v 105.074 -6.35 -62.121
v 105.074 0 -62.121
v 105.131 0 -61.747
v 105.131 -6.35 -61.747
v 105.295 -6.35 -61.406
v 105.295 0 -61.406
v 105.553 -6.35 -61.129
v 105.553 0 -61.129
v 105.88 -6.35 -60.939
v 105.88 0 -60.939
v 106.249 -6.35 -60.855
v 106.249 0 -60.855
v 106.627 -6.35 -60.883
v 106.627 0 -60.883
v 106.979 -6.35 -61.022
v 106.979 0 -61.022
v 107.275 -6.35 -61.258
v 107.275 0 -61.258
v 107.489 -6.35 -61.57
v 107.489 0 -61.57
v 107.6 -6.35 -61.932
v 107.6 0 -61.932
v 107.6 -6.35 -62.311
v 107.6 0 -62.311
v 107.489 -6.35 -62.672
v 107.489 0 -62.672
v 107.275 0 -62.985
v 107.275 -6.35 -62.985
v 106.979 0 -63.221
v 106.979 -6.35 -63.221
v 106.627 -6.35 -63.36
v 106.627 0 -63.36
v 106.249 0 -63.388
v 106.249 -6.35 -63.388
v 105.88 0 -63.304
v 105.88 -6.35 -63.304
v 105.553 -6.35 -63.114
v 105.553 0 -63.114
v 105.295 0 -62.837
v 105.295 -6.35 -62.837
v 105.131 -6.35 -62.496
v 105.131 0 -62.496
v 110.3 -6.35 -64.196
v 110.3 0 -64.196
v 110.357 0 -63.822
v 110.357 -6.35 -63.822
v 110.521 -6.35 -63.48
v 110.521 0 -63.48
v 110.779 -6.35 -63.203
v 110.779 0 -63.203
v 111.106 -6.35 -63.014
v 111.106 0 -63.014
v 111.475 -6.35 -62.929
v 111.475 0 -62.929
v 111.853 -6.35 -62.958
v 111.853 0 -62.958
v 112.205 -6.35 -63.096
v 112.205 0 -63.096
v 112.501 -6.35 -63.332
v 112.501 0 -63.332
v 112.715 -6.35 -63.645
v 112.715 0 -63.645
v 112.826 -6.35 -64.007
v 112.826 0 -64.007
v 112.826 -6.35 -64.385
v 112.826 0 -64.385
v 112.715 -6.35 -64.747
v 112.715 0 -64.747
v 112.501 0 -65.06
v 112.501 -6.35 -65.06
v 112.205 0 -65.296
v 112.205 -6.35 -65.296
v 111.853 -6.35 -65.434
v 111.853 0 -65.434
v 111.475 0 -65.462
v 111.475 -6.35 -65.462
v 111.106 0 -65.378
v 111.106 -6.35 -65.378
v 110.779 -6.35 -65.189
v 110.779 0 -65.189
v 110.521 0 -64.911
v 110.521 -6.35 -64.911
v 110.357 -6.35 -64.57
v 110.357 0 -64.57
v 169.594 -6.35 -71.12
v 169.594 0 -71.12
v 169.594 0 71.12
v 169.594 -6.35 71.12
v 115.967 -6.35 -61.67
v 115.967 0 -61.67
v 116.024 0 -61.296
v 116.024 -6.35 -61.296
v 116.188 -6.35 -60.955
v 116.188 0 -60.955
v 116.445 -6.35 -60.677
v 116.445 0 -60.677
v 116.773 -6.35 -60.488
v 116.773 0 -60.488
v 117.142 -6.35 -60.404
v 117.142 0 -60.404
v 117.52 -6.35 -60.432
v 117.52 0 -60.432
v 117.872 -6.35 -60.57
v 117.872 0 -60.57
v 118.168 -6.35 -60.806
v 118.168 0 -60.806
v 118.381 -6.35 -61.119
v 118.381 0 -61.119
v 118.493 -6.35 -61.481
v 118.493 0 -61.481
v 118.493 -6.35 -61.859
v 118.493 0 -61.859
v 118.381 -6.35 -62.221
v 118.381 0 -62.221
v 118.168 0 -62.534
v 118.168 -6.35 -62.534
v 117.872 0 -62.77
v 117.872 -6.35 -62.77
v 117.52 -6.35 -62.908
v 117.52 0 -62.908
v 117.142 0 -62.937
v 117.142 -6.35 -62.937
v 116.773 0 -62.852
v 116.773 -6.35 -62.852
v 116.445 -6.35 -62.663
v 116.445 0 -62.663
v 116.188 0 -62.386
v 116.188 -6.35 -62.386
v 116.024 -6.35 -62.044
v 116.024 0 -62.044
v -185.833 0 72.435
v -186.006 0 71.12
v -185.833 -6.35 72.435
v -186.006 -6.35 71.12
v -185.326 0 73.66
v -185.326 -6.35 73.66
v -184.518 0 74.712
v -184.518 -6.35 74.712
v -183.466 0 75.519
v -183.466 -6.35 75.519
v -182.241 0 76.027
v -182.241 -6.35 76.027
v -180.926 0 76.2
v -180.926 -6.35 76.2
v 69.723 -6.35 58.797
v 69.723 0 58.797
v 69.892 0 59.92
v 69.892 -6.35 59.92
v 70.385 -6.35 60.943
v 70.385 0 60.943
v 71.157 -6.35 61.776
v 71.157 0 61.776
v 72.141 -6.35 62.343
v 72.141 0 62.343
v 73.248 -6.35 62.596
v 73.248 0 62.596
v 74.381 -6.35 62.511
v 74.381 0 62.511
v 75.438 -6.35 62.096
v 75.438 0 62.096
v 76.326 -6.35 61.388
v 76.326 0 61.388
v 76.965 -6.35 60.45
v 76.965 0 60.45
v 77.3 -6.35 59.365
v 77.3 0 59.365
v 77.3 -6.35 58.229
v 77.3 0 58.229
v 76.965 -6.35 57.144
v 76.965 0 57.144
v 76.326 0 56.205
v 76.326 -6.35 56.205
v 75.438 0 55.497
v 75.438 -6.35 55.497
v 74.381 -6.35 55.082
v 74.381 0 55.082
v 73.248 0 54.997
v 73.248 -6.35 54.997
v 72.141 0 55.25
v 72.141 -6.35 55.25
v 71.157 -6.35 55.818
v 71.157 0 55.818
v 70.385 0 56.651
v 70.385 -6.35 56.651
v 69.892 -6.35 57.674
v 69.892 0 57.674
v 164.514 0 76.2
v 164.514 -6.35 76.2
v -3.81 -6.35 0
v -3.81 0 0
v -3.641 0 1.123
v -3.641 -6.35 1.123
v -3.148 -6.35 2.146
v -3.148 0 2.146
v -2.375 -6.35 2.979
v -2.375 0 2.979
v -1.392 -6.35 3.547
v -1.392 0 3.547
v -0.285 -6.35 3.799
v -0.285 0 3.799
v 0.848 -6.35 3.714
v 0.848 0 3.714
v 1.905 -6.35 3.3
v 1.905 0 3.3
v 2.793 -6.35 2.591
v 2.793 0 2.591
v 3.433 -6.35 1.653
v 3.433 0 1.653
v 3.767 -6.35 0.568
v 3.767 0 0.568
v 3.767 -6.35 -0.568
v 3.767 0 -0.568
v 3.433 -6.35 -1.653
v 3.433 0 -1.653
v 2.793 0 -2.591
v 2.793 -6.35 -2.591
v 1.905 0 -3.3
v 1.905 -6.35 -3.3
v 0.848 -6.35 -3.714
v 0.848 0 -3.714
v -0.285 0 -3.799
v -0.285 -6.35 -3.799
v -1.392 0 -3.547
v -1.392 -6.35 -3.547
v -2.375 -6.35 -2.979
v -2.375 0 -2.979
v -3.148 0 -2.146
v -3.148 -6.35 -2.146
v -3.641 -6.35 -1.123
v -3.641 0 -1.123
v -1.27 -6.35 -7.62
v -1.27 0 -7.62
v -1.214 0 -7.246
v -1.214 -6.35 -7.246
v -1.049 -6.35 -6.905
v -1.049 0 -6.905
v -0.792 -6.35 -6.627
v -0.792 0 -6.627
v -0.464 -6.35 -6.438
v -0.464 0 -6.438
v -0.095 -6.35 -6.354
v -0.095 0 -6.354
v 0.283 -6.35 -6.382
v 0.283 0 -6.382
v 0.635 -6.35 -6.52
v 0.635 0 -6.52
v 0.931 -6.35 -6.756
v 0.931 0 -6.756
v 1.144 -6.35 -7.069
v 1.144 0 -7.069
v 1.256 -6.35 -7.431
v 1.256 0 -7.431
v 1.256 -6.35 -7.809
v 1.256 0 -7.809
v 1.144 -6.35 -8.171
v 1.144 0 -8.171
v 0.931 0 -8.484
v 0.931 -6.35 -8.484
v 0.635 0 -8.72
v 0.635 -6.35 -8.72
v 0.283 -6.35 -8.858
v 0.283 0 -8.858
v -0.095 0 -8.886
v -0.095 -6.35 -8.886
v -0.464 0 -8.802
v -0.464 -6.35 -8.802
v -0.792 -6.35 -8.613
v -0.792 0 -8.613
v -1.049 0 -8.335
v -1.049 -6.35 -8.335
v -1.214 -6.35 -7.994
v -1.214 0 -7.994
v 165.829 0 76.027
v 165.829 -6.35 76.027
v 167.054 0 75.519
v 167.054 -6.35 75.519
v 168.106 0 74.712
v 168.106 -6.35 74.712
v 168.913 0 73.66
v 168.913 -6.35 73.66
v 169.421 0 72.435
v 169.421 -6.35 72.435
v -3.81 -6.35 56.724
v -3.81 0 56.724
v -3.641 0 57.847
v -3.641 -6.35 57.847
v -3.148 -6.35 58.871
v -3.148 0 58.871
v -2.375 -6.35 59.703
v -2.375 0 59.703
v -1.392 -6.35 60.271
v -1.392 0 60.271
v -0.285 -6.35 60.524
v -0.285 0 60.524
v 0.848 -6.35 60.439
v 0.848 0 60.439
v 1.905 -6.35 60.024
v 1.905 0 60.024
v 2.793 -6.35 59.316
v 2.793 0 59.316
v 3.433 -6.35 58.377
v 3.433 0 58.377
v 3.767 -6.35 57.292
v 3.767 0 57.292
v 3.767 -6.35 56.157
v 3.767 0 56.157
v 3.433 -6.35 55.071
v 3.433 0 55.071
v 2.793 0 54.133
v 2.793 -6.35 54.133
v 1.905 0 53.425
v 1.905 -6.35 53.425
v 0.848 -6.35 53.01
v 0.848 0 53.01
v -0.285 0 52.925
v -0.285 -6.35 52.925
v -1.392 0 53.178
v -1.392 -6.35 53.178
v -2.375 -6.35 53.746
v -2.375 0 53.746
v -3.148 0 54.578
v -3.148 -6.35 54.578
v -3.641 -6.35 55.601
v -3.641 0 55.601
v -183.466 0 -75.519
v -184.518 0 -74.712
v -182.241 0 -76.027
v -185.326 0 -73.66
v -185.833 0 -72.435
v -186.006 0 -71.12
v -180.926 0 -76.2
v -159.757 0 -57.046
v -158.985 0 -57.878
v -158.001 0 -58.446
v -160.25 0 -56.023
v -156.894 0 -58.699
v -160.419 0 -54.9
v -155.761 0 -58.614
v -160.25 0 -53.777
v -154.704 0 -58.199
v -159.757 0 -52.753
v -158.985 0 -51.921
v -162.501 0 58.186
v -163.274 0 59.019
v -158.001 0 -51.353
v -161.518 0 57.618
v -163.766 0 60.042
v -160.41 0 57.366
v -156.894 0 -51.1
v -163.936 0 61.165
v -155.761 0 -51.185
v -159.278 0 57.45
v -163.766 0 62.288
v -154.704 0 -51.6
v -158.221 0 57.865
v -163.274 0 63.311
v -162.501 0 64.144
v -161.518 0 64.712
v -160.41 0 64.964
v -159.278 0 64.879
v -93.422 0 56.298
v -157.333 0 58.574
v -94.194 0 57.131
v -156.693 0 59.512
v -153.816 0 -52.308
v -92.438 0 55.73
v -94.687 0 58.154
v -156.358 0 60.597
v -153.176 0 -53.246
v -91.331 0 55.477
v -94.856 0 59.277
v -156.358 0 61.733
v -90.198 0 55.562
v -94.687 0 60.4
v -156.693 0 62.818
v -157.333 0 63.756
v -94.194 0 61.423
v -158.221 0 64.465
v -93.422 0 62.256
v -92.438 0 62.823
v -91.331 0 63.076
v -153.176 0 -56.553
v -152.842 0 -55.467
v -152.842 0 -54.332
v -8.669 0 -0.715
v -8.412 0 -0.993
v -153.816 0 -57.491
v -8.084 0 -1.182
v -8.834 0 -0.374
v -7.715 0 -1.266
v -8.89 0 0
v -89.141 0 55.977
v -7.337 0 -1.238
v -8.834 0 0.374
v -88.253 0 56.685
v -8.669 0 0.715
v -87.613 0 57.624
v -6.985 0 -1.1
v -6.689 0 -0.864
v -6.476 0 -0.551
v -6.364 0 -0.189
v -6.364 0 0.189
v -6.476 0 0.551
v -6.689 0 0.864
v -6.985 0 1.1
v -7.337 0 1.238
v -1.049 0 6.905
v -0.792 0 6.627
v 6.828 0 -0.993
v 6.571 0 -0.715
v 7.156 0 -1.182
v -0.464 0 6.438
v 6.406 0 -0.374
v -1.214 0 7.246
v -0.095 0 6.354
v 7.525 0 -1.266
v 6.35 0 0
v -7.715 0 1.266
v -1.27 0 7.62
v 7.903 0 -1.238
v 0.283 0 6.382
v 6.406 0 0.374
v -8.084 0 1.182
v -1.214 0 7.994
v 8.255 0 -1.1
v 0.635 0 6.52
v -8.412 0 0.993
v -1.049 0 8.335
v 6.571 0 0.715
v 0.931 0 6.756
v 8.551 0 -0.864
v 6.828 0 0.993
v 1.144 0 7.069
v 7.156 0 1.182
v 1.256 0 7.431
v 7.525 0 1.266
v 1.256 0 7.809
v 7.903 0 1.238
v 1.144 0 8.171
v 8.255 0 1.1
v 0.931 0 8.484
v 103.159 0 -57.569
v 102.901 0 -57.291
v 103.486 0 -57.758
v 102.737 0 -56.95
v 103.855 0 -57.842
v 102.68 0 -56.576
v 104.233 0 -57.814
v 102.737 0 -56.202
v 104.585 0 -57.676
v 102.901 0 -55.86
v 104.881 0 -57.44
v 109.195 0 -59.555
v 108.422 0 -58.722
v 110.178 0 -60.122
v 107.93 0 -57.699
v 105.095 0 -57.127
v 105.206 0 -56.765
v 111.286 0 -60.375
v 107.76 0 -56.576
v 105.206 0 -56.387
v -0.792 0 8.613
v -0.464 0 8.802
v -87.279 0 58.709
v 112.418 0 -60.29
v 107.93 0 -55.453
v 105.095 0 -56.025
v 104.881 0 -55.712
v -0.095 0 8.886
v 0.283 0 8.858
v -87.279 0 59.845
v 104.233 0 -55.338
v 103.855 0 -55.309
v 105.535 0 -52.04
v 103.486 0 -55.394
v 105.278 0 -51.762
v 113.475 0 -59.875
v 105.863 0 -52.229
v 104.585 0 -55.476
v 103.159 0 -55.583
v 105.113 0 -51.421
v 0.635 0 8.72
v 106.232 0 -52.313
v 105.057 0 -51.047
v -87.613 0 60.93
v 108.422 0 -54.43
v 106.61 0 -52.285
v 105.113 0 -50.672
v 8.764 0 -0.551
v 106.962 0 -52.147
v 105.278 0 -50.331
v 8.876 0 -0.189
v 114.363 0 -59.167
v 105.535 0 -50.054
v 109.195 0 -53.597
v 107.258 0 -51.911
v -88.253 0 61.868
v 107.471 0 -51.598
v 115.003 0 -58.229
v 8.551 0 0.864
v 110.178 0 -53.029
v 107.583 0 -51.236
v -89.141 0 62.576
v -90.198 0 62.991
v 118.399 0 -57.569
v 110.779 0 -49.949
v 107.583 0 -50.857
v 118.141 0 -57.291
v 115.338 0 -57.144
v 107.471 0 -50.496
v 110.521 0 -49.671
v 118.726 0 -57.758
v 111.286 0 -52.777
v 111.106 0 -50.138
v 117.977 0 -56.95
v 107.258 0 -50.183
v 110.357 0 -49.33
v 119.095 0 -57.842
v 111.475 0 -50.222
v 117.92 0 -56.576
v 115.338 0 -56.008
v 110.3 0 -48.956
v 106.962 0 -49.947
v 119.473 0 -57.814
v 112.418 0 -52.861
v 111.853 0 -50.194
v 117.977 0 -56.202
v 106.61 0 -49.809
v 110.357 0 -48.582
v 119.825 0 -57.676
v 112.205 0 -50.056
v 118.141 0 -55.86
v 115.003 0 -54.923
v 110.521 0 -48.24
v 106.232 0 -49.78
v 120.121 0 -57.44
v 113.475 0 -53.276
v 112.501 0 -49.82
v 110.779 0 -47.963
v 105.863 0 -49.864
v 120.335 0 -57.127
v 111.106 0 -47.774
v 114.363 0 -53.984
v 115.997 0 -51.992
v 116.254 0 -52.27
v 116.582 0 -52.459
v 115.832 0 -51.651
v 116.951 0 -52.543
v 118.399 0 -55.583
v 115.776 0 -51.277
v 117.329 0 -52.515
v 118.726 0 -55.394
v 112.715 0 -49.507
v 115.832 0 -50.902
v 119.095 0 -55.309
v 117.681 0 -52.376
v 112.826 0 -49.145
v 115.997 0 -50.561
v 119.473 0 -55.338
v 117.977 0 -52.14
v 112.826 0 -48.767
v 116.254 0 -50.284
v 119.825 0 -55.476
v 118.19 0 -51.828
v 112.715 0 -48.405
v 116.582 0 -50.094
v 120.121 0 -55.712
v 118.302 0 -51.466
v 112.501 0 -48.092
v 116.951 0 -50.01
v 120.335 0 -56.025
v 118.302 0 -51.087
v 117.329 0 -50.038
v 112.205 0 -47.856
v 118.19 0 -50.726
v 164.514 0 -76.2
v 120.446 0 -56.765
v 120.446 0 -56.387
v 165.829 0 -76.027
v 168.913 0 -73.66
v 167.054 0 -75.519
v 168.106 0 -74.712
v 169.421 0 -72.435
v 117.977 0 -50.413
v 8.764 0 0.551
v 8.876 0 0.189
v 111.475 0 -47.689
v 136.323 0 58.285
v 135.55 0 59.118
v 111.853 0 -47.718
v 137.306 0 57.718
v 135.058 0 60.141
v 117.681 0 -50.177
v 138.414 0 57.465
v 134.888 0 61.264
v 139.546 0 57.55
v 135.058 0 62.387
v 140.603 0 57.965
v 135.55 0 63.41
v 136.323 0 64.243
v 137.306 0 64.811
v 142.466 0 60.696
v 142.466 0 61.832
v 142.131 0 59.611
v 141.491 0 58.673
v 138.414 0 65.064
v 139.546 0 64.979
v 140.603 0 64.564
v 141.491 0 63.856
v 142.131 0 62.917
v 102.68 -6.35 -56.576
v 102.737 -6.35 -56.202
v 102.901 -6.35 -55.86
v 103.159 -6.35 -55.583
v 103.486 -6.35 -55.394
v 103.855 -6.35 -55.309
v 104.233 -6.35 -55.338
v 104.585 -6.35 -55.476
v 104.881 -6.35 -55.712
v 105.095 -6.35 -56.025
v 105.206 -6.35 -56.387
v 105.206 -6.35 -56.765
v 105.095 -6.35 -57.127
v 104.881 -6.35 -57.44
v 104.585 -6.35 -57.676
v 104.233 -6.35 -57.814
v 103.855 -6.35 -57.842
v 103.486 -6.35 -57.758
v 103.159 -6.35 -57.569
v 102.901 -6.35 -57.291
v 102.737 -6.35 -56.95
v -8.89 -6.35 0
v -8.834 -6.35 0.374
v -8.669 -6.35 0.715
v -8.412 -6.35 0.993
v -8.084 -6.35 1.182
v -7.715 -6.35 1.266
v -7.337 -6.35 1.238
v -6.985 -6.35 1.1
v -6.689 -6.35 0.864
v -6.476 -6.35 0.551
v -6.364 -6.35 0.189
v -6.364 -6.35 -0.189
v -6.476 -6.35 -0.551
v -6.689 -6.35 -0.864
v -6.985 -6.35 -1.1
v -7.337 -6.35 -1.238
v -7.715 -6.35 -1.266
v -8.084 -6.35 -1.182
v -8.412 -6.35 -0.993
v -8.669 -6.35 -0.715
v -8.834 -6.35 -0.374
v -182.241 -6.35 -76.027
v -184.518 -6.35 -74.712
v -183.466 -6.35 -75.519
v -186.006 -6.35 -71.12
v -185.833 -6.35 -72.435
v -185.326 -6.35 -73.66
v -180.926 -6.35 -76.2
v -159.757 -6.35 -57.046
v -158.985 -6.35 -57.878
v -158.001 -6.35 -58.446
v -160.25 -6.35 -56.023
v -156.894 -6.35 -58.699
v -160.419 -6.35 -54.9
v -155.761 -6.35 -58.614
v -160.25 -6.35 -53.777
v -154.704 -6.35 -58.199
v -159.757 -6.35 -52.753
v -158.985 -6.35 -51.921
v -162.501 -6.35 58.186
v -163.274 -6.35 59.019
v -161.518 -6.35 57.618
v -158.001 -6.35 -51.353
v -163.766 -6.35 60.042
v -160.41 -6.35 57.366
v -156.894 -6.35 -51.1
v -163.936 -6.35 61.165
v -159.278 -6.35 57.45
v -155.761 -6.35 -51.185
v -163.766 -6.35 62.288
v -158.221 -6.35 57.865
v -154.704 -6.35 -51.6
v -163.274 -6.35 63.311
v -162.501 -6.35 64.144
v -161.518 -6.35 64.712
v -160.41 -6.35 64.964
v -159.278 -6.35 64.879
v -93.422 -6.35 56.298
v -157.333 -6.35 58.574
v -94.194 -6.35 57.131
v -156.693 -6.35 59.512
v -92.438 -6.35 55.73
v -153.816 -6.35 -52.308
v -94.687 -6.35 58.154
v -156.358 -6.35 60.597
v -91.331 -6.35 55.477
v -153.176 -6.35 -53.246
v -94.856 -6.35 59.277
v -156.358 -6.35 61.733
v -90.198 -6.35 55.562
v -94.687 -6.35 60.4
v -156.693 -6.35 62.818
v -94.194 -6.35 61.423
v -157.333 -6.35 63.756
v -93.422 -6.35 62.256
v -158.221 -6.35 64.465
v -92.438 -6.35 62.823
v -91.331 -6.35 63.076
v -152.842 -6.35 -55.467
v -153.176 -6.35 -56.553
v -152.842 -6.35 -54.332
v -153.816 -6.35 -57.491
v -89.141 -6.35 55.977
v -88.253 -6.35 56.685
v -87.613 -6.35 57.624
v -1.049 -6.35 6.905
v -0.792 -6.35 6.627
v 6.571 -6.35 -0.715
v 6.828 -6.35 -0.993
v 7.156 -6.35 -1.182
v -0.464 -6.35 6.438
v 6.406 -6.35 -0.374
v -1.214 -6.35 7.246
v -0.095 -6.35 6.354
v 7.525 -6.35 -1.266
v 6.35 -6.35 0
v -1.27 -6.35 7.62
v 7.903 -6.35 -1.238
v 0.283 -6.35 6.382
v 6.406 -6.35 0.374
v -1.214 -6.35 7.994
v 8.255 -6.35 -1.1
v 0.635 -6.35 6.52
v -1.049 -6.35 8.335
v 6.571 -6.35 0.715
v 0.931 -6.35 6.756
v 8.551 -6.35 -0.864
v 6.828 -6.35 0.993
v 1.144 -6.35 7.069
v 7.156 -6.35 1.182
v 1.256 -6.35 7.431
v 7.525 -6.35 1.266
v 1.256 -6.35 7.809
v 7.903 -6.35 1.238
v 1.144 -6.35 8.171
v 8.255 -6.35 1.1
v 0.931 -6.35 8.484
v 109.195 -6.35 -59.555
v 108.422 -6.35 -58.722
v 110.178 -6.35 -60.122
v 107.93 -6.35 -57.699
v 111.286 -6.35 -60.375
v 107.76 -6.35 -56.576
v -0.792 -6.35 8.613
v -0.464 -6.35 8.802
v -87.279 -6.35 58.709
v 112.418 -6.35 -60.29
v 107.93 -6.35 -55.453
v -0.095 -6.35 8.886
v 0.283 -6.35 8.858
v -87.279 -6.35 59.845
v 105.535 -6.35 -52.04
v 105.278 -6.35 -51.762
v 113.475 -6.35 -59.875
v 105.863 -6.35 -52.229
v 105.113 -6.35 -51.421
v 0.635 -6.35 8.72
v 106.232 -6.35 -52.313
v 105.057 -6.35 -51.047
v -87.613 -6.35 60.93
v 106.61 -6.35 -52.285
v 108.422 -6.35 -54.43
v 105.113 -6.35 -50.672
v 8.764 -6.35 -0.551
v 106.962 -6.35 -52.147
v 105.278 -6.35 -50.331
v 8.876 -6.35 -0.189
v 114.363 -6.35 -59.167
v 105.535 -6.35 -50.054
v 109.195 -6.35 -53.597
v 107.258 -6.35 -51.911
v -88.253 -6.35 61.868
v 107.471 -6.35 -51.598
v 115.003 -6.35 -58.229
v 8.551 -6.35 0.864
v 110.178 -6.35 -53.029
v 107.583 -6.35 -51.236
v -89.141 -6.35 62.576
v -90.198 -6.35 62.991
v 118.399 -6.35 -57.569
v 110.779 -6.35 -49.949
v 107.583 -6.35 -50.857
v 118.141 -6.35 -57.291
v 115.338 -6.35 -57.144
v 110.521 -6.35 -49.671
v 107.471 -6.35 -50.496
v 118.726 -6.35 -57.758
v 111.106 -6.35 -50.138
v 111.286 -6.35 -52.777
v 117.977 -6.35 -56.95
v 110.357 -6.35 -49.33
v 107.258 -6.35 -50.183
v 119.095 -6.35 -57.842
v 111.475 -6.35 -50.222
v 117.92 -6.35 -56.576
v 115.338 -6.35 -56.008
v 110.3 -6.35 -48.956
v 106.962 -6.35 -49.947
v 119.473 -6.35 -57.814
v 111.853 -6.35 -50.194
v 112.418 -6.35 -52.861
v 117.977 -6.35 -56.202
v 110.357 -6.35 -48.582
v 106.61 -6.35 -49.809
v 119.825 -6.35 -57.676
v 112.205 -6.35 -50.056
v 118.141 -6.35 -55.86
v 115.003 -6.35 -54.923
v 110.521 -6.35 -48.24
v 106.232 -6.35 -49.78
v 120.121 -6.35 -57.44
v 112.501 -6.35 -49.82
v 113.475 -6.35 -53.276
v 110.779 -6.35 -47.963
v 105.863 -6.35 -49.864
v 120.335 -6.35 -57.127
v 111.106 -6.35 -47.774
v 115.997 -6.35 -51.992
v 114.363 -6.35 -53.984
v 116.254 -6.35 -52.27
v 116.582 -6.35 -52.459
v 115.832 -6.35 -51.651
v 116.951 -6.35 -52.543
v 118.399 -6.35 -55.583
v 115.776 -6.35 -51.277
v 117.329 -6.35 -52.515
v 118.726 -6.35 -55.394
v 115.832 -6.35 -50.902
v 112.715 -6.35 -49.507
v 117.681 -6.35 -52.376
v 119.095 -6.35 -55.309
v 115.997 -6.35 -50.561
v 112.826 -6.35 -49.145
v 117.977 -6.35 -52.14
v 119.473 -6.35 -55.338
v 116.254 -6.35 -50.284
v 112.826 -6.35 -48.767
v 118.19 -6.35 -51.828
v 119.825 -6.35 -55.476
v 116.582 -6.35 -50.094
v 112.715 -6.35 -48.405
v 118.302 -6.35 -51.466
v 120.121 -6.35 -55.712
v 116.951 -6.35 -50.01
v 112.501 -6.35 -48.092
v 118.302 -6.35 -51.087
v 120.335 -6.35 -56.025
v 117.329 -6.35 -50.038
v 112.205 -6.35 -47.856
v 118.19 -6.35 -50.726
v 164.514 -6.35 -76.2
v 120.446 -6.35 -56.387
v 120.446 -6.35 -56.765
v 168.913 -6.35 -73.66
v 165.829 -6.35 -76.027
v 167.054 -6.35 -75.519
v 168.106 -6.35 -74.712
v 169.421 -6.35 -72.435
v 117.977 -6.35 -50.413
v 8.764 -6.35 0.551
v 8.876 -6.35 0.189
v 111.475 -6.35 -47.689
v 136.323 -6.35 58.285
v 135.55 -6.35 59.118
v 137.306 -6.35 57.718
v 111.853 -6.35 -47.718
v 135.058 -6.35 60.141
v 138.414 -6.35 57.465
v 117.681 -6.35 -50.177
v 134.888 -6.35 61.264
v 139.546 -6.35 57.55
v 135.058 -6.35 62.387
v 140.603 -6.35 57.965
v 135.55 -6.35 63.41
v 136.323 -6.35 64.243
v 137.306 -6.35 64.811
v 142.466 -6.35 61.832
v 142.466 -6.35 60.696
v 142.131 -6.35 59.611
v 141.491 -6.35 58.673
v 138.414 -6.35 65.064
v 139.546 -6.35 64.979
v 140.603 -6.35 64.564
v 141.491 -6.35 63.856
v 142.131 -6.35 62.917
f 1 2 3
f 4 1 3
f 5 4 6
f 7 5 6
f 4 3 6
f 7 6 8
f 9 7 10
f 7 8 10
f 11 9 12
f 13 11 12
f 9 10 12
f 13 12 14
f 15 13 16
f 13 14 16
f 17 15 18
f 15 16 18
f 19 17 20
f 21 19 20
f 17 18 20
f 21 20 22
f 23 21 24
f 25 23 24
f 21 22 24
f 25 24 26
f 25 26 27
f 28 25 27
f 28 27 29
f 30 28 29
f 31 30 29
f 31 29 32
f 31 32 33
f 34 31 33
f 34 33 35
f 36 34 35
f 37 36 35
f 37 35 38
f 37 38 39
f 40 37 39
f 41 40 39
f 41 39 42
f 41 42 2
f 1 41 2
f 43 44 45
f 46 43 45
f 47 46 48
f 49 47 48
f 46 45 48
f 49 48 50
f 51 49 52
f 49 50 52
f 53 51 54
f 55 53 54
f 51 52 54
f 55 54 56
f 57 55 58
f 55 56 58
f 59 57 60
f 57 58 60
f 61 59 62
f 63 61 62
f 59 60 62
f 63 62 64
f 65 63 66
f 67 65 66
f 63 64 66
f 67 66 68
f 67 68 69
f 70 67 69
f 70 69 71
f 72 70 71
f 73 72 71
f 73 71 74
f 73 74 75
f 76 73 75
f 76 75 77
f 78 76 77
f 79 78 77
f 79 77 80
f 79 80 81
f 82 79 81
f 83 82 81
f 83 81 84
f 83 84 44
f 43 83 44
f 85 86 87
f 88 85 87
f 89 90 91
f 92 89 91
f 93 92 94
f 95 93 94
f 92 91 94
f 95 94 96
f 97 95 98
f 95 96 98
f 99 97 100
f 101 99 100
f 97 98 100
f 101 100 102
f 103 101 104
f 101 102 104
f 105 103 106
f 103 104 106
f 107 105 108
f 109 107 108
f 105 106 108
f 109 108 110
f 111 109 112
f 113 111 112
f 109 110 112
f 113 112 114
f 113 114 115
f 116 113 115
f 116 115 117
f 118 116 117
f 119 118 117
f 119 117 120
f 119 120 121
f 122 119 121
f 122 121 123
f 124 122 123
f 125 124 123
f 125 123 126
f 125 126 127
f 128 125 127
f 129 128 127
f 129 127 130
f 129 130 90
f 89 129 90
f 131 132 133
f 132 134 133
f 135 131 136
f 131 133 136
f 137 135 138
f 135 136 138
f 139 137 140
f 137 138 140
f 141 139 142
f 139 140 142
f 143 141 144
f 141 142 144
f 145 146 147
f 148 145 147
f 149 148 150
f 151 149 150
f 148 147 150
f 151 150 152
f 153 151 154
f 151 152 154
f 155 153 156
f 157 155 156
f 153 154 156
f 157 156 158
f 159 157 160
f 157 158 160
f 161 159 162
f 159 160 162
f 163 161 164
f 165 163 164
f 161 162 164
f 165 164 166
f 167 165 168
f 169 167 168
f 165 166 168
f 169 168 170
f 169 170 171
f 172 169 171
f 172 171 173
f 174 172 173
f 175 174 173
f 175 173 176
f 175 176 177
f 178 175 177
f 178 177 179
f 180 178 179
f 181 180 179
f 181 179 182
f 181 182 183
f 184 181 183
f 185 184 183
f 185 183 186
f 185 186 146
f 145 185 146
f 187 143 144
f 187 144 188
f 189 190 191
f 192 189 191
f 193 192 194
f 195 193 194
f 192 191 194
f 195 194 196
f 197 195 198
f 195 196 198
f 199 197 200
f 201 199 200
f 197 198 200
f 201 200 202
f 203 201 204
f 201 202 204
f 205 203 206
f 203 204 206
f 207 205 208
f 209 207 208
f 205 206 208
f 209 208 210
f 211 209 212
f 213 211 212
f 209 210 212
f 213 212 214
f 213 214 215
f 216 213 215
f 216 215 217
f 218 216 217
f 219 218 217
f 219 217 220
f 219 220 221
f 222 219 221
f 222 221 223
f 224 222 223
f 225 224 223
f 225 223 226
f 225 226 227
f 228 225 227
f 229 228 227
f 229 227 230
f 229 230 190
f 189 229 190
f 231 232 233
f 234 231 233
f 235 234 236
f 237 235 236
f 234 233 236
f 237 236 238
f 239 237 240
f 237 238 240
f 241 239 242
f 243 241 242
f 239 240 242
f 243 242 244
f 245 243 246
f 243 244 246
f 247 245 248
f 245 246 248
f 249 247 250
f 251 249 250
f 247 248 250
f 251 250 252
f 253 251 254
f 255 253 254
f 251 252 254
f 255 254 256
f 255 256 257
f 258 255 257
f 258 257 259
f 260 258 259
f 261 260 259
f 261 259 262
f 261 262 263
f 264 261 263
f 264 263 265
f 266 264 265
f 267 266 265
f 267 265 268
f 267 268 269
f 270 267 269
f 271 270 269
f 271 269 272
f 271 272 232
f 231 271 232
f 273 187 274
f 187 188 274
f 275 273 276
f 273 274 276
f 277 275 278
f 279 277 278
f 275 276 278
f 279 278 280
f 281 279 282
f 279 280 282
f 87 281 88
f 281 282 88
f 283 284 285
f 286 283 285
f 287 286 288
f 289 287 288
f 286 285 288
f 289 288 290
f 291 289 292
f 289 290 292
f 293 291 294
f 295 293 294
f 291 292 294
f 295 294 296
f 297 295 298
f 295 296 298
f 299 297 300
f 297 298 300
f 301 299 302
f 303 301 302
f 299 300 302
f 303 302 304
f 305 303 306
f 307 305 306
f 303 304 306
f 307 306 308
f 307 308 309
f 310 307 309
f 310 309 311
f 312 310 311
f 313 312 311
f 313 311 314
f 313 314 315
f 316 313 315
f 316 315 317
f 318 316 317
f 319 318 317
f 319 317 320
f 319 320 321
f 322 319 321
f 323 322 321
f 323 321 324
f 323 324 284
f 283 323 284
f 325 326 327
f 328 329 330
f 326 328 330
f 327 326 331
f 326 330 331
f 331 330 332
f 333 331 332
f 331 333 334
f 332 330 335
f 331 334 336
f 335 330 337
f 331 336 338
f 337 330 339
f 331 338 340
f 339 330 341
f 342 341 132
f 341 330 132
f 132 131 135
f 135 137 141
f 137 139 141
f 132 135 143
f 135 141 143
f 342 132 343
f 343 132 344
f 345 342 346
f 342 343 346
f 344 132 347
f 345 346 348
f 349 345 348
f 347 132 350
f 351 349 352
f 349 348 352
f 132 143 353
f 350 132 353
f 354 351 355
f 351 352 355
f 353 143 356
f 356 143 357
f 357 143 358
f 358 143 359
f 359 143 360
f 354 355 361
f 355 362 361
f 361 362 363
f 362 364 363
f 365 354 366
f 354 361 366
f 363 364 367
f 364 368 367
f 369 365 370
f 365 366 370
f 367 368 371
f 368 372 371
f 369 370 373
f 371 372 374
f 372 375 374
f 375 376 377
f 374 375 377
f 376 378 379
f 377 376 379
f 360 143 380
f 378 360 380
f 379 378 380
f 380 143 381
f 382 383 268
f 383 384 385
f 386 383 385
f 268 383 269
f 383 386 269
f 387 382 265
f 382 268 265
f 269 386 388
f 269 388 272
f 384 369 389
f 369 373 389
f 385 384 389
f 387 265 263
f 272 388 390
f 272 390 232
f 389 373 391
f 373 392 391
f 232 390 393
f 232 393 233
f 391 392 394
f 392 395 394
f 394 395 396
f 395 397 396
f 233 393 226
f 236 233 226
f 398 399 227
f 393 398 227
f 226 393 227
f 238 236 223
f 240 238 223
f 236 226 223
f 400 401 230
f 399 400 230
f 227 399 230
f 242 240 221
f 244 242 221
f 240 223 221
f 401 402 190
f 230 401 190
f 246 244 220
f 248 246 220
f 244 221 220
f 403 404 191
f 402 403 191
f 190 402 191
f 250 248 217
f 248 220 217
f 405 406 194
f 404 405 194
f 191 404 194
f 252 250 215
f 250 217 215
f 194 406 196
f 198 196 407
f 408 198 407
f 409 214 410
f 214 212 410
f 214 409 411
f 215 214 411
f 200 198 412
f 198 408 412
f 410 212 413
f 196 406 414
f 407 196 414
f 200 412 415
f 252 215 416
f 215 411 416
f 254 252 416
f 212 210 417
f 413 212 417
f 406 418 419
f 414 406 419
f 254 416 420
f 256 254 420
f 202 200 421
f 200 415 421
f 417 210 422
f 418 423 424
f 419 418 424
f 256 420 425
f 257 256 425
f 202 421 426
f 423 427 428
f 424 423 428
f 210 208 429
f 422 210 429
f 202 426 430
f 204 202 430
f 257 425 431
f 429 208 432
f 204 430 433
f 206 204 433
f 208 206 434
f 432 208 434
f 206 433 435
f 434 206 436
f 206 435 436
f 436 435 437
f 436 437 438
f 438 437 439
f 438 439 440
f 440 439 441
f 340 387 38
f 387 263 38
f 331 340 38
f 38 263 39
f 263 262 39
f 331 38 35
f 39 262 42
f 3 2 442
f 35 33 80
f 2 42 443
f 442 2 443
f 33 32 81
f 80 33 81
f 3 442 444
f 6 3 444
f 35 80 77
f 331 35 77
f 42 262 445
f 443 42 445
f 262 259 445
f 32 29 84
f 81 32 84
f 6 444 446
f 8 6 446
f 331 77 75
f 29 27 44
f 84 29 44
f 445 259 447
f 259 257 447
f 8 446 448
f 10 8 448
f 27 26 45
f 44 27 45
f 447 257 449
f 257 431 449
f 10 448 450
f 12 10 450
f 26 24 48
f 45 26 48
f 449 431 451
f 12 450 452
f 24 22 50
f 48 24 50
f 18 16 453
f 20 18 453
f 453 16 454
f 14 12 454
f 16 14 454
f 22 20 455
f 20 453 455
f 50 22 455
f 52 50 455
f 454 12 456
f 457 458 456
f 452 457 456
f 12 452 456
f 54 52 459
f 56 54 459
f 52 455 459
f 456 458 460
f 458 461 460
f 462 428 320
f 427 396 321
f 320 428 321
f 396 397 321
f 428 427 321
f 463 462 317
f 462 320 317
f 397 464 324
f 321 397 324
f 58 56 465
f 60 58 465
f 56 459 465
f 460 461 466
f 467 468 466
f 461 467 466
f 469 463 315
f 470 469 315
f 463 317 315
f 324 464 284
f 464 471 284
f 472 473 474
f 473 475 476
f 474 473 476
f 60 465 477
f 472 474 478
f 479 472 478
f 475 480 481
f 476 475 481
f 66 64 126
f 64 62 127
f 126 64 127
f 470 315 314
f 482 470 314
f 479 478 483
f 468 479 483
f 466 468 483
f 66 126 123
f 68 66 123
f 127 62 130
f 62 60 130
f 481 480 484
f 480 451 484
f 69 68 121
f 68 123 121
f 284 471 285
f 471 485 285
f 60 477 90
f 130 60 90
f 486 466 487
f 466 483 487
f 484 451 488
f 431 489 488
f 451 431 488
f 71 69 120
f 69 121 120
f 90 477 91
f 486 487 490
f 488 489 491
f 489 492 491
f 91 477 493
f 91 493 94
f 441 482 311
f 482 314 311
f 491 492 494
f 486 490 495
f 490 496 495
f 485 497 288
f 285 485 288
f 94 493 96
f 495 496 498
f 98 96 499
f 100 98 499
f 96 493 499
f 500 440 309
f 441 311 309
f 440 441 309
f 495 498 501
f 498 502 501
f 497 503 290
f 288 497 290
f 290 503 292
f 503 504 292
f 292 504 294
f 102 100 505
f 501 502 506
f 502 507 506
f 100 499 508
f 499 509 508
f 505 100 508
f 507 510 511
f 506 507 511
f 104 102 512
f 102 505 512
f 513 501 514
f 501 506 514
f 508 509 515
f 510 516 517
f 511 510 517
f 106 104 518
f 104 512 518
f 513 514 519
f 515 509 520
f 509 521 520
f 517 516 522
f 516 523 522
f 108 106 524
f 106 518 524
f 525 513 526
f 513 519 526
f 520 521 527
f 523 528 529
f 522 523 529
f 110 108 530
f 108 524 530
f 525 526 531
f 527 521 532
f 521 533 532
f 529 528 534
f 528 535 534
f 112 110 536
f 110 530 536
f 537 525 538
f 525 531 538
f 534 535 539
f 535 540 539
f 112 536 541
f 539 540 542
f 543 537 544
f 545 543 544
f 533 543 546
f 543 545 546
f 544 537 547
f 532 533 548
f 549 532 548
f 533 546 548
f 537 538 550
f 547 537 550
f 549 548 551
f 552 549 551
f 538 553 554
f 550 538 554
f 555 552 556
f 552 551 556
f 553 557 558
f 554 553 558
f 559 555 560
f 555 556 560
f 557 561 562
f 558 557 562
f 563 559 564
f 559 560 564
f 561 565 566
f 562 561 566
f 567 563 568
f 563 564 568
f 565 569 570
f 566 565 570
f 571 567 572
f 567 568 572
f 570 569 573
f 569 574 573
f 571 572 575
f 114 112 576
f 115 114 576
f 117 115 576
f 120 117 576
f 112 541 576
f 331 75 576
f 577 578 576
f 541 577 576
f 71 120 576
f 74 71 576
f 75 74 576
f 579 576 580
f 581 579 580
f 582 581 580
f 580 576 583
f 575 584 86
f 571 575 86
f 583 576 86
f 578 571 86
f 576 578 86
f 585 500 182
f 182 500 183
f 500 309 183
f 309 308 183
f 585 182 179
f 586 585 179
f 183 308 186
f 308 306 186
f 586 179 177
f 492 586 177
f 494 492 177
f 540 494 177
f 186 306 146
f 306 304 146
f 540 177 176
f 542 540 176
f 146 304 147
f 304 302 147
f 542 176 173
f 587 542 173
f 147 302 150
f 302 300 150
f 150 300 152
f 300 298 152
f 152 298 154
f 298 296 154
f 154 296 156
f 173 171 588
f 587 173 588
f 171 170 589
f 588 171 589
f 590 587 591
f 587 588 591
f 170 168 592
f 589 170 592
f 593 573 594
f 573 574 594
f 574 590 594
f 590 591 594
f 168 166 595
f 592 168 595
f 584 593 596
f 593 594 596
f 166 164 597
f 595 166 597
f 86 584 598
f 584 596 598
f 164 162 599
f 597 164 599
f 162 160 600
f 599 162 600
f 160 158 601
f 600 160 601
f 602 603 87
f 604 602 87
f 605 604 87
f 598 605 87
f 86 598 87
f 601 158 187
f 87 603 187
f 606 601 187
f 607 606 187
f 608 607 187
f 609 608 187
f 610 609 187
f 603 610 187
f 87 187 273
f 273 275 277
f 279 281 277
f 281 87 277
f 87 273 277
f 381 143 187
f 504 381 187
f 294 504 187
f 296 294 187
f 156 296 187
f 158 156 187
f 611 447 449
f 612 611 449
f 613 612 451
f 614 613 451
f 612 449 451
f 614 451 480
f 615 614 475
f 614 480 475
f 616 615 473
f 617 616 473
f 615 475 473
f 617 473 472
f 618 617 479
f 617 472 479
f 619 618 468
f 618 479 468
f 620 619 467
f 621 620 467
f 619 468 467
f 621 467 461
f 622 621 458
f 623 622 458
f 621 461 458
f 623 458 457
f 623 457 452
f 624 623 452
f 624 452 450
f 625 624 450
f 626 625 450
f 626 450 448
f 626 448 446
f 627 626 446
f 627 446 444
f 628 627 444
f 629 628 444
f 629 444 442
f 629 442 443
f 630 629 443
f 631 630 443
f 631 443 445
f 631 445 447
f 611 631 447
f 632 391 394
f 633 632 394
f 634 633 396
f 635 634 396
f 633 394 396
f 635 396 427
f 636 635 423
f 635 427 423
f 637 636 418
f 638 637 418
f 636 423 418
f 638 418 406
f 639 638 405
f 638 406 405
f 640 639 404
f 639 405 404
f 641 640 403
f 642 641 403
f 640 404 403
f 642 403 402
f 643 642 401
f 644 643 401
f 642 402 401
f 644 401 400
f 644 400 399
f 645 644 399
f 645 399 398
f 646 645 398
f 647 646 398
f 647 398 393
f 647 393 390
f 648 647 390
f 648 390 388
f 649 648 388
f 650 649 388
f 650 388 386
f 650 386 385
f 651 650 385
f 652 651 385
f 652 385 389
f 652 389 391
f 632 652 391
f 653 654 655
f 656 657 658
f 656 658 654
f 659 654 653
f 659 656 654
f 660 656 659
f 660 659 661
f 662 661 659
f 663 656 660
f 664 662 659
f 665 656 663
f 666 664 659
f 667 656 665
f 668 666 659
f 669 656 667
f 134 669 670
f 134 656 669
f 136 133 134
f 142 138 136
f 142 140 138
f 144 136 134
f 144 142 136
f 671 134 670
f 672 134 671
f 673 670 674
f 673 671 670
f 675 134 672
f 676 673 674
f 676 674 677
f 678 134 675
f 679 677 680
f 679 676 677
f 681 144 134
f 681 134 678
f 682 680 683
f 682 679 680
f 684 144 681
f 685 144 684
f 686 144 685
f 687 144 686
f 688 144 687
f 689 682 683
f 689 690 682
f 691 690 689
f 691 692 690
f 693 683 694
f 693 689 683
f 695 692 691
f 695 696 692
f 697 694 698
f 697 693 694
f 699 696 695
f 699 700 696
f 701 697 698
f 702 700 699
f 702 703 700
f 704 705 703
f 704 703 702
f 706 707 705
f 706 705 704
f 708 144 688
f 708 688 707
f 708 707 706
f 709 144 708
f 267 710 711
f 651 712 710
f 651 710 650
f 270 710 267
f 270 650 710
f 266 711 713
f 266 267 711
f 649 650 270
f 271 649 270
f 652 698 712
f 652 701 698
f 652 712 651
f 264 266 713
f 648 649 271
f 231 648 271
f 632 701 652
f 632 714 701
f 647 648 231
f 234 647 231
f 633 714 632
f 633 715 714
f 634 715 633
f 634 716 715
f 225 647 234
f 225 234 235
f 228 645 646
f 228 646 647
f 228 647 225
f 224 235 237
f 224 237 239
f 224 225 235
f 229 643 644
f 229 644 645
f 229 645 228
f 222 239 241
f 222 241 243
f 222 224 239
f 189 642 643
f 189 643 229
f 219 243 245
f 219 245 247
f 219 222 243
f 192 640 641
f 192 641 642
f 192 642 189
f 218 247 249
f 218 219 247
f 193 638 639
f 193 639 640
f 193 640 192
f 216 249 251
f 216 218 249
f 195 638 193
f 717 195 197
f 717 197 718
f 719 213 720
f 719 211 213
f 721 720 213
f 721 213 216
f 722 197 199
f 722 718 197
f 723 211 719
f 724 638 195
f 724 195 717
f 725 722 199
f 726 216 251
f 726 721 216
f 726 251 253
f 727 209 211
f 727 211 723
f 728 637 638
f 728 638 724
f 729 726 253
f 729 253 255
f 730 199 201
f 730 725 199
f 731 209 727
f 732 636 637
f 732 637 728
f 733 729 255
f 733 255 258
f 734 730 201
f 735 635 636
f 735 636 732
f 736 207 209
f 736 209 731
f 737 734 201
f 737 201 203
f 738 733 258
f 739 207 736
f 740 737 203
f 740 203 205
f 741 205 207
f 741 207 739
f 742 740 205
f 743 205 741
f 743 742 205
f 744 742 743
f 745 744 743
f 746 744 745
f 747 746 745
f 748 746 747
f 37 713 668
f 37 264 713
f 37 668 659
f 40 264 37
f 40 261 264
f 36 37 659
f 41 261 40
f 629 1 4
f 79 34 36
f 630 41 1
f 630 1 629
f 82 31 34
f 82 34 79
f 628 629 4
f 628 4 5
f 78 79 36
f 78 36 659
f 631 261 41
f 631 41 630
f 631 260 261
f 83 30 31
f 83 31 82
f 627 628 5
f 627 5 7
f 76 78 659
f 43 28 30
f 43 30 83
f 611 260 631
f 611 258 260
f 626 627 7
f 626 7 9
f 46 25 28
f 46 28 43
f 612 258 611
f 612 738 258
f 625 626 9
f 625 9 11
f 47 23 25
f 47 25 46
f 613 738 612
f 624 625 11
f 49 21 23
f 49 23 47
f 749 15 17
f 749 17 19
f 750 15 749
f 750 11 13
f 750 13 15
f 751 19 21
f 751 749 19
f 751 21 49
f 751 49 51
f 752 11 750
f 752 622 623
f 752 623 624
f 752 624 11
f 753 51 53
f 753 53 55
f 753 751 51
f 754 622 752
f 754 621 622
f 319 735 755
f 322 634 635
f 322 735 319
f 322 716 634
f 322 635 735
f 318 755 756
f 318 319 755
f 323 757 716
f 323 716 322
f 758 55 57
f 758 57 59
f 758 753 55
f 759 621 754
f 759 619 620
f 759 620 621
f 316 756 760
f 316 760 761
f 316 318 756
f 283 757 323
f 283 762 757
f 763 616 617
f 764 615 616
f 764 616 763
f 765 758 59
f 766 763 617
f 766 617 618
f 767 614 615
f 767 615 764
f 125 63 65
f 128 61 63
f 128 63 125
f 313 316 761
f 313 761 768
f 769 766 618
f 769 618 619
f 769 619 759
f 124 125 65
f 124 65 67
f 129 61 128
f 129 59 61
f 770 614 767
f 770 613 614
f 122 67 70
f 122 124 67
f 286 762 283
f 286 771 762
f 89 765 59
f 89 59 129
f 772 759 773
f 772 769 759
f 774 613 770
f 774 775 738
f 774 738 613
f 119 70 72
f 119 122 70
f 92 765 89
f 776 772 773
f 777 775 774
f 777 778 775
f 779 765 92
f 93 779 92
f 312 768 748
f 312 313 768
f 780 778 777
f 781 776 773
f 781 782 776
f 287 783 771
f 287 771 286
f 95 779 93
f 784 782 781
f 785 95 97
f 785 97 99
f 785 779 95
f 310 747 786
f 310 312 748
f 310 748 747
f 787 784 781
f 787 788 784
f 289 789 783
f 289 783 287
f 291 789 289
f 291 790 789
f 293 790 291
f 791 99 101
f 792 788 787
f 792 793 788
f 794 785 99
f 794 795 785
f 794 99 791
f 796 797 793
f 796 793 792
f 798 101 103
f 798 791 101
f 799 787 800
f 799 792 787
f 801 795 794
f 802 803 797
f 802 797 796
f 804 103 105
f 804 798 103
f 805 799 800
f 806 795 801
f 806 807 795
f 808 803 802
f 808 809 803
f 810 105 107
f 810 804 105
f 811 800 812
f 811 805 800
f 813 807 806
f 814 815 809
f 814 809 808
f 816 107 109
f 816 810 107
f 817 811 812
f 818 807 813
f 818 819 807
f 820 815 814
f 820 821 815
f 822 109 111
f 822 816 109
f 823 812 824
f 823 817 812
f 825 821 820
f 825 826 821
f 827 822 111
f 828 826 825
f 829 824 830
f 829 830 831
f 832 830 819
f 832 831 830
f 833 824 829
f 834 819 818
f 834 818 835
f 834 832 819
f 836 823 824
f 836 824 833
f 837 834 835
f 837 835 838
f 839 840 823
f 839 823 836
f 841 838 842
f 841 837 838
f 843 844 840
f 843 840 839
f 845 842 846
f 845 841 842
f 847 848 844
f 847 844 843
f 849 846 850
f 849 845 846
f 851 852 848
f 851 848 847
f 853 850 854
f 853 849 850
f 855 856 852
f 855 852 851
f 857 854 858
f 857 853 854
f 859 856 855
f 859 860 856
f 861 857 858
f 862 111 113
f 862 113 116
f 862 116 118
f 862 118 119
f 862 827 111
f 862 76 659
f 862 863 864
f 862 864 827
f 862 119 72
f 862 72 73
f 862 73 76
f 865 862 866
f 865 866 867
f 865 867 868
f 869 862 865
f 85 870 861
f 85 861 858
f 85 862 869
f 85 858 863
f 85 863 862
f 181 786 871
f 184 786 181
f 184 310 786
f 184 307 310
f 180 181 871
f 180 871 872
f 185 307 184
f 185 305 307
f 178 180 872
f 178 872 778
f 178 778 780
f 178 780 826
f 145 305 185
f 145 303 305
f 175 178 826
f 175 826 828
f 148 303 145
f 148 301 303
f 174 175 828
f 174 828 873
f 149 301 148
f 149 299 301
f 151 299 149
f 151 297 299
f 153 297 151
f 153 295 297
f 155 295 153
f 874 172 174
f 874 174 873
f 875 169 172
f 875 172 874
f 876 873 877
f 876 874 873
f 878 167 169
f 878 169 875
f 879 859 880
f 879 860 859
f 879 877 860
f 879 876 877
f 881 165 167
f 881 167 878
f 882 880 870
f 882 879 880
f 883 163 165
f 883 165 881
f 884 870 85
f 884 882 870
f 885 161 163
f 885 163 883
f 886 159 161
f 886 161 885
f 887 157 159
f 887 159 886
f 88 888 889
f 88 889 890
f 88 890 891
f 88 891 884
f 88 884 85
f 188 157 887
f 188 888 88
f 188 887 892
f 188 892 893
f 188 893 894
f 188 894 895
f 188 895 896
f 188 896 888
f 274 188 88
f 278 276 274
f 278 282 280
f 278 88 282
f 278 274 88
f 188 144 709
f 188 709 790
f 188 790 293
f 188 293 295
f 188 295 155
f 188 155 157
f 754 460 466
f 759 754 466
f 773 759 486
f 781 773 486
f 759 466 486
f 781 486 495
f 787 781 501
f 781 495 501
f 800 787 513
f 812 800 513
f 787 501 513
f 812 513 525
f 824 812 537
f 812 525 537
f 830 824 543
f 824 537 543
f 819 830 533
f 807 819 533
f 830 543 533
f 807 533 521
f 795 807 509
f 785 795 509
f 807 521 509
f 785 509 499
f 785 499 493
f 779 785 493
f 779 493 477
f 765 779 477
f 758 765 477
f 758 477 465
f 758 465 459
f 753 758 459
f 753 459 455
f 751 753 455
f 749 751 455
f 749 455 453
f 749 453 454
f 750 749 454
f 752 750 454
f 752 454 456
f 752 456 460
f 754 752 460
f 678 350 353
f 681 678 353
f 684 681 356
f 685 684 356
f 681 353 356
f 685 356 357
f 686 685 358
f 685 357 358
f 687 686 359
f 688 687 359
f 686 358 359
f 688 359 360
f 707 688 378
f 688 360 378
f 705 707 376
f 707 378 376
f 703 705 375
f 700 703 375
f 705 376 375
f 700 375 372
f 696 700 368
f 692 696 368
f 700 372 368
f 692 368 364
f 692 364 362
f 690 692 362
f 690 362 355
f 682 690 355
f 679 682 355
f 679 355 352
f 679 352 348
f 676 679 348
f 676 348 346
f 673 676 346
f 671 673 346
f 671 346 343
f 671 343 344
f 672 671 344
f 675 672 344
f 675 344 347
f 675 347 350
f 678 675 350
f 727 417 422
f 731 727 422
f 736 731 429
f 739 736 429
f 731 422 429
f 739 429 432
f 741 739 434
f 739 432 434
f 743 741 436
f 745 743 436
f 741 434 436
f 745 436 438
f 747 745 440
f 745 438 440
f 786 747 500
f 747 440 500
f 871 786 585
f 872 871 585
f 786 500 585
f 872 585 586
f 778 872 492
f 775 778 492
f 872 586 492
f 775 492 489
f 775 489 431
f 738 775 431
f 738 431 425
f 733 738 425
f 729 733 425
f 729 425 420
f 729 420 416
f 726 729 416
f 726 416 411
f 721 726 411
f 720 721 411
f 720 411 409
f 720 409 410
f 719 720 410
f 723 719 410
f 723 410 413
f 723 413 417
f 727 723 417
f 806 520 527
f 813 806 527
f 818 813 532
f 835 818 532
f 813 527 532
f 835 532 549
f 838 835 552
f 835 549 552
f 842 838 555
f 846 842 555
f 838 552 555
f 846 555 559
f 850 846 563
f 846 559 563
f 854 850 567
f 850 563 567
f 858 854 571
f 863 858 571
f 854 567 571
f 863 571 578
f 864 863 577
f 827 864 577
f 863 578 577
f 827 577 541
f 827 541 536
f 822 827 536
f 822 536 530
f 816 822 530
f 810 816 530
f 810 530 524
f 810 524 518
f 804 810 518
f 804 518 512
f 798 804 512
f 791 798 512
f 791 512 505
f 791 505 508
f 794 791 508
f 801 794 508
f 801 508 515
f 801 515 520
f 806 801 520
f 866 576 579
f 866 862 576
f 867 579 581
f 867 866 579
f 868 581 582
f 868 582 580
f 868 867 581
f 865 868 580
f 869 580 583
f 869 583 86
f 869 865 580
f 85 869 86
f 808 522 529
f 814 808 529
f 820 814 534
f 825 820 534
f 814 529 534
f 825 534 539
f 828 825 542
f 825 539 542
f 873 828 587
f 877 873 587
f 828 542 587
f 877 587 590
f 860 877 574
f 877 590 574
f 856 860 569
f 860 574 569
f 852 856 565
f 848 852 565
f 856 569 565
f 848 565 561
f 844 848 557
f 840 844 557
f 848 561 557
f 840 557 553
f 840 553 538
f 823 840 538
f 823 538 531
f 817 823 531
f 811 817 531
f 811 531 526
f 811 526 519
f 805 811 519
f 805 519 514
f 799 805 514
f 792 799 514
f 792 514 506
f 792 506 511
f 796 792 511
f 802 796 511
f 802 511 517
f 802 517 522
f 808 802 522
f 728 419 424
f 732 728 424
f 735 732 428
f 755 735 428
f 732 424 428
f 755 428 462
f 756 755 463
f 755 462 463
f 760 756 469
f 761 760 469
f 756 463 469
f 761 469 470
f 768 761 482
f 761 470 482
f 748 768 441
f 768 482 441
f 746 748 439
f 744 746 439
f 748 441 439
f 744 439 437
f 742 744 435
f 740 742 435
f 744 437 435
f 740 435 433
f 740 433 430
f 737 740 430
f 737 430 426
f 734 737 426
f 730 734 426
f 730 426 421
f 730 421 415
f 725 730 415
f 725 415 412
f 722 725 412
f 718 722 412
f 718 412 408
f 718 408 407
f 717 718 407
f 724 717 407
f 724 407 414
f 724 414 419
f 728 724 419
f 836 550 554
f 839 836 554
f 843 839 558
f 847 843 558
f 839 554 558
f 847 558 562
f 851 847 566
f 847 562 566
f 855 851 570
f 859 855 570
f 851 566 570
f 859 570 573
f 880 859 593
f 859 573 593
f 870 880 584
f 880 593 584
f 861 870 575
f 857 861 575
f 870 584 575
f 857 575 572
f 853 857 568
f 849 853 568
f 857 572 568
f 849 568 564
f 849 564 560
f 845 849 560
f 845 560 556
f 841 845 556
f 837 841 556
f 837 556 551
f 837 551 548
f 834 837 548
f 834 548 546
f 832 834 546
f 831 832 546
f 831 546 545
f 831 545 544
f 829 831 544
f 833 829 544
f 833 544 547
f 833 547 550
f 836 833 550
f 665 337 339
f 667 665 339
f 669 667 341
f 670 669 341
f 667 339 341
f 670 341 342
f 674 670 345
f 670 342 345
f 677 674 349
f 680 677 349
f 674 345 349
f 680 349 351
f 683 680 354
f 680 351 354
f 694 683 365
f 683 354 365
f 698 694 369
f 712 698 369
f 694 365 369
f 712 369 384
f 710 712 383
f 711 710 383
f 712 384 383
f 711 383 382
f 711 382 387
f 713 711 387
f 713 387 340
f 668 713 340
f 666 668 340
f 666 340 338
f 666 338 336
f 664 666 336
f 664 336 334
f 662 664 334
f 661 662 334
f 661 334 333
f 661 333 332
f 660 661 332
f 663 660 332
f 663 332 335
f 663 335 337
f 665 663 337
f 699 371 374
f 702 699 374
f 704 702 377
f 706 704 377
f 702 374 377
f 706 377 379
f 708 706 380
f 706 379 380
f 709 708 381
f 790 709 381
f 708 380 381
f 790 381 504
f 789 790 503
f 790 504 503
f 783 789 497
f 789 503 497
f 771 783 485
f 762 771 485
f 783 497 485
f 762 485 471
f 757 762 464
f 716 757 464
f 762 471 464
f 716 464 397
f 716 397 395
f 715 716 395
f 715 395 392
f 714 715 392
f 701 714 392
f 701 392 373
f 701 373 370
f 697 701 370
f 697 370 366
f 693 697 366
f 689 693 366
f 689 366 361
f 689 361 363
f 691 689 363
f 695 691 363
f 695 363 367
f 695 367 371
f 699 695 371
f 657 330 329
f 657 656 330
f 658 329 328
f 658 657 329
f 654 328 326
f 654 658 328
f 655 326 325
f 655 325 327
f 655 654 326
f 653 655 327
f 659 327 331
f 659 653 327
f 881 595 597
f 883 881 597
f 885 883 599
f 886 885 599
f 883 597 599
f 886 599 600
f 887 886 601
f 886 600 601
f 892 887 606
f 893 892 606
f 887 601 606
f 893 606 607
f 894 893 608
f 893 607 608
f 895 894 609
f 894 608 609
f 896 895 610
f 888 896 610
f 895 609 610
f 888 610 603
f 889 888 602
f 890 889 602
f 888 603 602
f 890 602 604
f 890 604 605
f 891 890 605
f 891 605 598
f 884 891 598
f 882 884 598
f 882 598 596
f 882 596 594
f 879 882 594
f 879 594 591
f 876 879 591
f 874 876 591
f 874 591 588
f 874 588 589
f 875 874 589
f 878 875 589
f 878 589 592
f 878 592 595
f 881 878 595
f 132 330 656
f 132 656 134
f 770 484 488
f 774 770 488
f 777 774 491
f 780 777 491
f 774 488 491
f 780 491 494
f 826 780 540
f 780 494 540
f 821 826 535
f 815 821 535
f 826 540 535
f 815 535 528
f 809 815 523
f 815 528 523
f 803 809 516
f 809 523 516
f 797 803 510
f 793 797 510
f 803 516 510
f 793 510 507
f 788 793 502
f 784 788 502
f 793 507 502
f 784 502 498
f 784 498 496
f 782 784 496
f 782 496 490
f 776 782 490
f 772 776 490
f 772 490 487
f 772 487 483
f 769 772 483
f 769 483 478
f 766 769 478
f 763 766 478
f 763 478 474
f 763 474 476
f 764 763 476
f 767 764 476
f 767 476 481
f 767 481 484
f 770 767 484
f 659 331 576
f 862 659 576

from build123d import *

# Parameters (mm, degrees)
F0_W     = 355.6
F0_H     = 152.4
F1_DEPTH = 6.35
F3_D     = 2.54
F5_D     = 7.62
F6_R     = 5.08
F8_D     = 2.54
F10_D    = 7.62
F12_D    = 7.62
F14_D    = 7.62
F16_D    = 7.62


with BuildPart() as f1:
    # F0 (on Front) → F1 (new body)
    with BuildSketch(Plane.XZ):
        with Locations((-8.206145, 0)):
            Rectangle(F0_W, F0_H)
    extrude(amount=F1_DEPTH)

    # F3 (through all)
    with Locations(Plane.XZ.offset(6.35)):
        with Locations((-7.62, 0), (0, 7.62), (7.62, 0), (0, -7.62)):
            Hole(F3_D / 2)

    # F5 (through all)
    with Locations(Plane.XZ.offset(6.35)):
        with Locations((0, 0), (111.570381, -56.575853), (138.698444, 61.264154)):
            Hole(F5_D / 2)

    # F6
    f6_edges = [f1.edges().sort_by_distance(p)[0] for p in [
        (169.593855, -3.175, 76.2),
        (169.593855, -3.175, -76.2),
        (-186.006145, -3.175, 76.2),
        (-186.006145, -3.175, -76.2),
    ]]
    fillet(f6_edges, radius=F6_R)

    # F8 (through all)
    with Locations(Plane.XZ.offset(6.35)):
        with Locations((111.570381, -48.955853), (117.046016, -51.276625), (119.190381, -56.575853), (117.237232, -61.670084), (111.570381, -64.195853), (106.344404, -62.121443), (103.950381, -56.575853), (106.327029, -51.046689)):
            Hole(F8_D / 2)

    # F10 (through all)
    with Locations(Plane.XZ.offset(6.35)):
        with Locations((-156.609148, -54.899529)):
            Hole(F10_D / 2)

    # F12 (through all)
    with Locations(Plane.XZ.offset(6.35)):
        with Locations((73.532805, 58.796812), (-160.125718, 61.164971)):
            Hole(F12_D / 2)

    # F14 (through all)
    with Locations(Plane.XZ.offset(6.35)):
        with Locations((-91.046117, 59.276842)):
            Hole(F14_D / 2)

    # F16 (through all)
    with Locations(Plane.XZ.offset(6.35)):
        with Locations((0, 56.724396)):
            Hole(F16_D / 2)


solid = f1.part
